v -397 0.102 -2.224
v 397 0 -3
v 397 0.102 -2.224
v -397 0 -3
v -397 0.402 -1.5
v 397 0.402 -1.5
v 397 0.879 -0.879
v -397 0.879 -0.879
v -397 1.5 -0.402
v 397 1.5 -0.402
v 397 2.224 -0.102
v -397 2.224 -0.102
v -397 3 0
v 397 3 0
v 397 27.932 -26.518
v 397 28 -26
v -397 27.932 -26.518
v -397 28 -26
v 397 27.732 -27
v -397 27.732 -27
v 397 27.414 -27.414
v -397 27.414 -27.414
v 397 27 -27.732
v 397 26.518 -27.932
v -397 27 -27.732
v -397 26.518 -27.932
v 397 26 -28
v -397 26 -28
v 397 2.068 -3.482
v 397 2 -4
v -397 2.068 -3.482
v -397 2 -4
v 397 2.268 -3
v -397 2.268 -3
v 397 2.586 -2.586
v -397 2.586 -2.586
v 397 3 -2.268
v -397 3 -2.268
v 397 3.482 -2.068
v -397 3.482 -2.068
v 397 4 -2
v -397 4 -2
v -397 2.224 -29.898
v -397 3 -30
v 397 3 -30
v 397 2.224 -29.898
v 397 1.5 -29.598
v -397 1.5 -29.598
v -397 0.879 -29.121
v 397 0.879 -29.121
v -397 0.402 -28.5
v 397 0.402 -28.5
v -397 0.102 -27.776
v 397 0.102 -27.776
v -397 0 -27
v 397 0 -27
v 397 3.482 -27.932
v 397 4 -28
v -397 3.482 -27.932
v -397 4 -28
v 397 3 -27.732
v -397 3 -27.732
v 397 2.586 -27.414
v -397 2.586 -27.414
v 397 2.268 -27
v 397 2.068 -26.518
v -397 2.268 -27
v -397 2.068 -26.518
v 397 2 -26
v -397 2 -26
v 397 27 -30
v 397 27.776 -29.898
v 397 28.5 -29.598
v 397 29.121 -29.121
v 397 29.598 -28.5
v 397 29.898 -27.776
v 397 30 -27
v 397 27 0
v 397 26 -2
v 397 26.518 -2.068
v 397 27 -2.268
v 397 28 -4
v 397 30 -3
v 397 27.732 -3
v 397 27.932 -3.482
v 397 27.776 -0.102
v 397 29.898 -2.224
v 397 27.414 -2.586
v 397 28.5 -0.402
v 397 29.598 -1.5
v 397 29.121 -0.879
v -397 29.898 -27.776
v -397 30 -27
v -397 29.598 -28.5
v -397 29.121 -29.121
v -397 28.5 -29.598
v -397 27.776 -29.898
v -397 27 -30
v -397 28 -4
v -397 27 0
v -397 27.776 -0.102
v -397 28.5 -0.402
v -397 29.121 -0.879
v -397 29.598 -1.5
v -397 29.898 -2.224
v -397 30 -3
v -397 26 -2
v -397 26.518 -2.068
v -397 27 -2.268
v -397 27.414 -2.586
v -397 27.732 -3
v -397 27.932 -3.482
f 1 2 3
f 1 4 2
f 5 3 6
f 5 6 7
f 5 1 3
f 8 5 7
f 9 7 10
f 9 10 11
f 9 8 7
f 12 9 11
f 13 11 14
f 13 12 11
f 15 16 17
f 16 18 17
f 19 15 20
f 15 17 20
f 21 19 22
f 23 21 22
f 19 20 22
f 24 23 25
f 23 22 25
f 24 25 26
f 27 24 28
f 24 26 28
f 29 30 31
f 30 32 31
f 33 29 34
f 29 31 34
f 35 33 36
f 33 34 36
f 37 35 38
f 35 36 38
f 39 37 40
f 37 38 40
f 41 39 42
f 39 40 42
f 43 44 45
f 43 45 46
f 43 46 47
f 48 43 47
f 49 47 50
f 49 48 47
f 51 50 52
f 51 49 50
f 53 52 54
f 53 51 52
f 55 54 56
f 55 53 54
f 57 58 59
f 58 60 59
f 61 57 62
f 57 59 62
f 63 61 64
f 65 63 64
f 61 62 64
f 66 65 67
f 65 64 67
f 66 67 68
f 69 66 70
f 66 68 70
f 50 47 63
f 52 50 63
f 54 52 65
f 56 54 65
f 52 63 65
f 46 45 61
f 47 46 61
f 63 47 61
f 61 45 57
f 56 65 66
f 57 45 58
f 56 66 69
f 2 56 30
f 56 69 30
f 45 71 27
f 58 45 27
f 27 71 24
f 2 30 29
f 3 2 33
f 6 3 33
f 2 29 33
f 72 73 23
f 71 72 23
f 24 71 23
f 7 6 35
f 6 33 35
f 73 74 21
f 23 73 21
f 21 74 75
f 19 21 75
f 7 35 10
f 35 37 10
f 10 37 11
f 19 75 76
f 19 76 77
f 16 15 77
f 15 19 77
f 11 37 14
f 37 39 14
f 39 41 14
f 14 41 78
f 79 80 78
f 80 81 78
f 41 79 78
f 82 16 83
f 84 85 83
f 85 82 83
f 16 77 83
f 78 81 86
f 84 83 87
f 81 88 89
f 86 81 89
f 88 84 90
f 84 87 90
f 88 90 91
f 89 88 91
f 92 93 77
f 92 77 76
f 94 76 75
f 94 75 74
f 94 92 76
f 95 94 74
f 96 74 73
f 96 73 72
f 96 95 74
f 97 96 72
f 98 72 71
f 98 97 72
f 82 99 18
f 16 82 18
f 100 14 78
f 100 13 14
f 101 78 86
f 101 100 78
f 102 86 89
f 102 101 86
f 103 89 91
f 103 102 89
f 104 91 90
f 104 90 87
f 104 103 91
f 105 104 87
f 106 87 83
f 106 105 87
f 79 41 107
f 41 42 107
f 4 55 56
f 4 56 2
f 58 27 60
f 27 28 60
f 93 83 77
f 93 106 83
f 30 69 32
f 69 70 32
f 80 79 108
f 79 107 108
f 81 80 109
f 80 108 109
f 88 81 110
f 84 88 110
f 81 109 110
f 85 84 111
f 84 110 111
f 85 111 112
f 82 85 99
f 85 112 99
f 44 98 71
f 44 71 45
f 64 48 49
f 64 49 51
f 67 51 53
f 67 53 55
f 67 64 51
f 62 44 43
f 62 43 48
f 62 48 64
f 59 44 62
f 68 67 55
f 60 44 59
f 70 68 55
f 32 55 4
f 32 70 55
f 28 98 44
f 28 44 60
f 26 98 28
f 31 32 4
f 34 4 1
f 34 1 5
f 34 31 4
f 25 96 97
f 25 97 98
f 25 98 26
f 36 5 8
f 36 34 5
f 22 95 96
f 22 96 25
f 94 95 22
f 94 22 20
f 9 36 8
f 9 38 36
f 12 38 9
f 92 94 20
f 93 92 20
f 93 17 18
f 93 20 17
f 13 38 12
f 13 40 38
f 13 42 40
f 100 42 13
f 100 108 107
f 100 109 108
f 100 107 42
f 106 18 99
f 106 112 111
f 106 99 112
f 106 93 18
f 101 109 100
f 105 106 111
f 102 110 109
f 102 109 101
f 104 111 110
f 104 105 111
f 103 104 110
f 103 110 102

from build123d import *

# Parameters (mm, degrees)
EXTRUDE_1_DEPTH = 397


with BuildPart() as part:
    # Эскиз1 → Бобышка-Вытянуть1 (new body)
    with BuildSketch(Plane(origin=(0, 0, 0), x_dir=(0, 0, -1), z_dir=(1, 0, 0))):
        with BuildLine():
            Line((3, 30), (27, 30))
            ThreePointArc((27, 30), (29.121320344, 29.121320344), (30, 27))
            Line((30, 27), (30, 3))
            ThreePointArc((30, 3), (29.121320344, 0.878679656), (27, 0))
            Line((27, 0), (3, 0))
            ThreePointArc((3, 0), (0.878679656, 0.878679656), (0, 3))
            Line((0, 3), (0, 27))
            ThreePointArc((0, 27), (0.878679656, 29.121320344), (3, 30))
        make_face()
        with BuildLine():
            Line((4, 28), (26, 28))
            ThreePointArc((26, 28), (27.414213562, 27.414213562), (28, 26))
            Line((28, 26), (28, 4))
            ThreePointArc((28, 4), (27.414213562, 2.585786438), (26, 2))
            Line((26, 2), (4, 2))
            ThreePointArc((4, 2), (2.585786438, 2.585786438), (2, 4))
            Line((2, 4), (2, 26))
            ThreePointArc((2, 26), (2.585786438, 27.414213562), (4, 28))
        make_face(mode=Mode.SUBTRACT)
    extrude(amount=-EXTRUDE_1_DEPTH)

    # Зеркальное отражение2: part across plane


with BuildPart() as part_1:
    add(part.part)
    add(part.part.mirror(Plane(origin=(0, 3, -3), x_dir=(0, 0, 1), z_dir=(1, 0, 0))))


solid = part_1.part
